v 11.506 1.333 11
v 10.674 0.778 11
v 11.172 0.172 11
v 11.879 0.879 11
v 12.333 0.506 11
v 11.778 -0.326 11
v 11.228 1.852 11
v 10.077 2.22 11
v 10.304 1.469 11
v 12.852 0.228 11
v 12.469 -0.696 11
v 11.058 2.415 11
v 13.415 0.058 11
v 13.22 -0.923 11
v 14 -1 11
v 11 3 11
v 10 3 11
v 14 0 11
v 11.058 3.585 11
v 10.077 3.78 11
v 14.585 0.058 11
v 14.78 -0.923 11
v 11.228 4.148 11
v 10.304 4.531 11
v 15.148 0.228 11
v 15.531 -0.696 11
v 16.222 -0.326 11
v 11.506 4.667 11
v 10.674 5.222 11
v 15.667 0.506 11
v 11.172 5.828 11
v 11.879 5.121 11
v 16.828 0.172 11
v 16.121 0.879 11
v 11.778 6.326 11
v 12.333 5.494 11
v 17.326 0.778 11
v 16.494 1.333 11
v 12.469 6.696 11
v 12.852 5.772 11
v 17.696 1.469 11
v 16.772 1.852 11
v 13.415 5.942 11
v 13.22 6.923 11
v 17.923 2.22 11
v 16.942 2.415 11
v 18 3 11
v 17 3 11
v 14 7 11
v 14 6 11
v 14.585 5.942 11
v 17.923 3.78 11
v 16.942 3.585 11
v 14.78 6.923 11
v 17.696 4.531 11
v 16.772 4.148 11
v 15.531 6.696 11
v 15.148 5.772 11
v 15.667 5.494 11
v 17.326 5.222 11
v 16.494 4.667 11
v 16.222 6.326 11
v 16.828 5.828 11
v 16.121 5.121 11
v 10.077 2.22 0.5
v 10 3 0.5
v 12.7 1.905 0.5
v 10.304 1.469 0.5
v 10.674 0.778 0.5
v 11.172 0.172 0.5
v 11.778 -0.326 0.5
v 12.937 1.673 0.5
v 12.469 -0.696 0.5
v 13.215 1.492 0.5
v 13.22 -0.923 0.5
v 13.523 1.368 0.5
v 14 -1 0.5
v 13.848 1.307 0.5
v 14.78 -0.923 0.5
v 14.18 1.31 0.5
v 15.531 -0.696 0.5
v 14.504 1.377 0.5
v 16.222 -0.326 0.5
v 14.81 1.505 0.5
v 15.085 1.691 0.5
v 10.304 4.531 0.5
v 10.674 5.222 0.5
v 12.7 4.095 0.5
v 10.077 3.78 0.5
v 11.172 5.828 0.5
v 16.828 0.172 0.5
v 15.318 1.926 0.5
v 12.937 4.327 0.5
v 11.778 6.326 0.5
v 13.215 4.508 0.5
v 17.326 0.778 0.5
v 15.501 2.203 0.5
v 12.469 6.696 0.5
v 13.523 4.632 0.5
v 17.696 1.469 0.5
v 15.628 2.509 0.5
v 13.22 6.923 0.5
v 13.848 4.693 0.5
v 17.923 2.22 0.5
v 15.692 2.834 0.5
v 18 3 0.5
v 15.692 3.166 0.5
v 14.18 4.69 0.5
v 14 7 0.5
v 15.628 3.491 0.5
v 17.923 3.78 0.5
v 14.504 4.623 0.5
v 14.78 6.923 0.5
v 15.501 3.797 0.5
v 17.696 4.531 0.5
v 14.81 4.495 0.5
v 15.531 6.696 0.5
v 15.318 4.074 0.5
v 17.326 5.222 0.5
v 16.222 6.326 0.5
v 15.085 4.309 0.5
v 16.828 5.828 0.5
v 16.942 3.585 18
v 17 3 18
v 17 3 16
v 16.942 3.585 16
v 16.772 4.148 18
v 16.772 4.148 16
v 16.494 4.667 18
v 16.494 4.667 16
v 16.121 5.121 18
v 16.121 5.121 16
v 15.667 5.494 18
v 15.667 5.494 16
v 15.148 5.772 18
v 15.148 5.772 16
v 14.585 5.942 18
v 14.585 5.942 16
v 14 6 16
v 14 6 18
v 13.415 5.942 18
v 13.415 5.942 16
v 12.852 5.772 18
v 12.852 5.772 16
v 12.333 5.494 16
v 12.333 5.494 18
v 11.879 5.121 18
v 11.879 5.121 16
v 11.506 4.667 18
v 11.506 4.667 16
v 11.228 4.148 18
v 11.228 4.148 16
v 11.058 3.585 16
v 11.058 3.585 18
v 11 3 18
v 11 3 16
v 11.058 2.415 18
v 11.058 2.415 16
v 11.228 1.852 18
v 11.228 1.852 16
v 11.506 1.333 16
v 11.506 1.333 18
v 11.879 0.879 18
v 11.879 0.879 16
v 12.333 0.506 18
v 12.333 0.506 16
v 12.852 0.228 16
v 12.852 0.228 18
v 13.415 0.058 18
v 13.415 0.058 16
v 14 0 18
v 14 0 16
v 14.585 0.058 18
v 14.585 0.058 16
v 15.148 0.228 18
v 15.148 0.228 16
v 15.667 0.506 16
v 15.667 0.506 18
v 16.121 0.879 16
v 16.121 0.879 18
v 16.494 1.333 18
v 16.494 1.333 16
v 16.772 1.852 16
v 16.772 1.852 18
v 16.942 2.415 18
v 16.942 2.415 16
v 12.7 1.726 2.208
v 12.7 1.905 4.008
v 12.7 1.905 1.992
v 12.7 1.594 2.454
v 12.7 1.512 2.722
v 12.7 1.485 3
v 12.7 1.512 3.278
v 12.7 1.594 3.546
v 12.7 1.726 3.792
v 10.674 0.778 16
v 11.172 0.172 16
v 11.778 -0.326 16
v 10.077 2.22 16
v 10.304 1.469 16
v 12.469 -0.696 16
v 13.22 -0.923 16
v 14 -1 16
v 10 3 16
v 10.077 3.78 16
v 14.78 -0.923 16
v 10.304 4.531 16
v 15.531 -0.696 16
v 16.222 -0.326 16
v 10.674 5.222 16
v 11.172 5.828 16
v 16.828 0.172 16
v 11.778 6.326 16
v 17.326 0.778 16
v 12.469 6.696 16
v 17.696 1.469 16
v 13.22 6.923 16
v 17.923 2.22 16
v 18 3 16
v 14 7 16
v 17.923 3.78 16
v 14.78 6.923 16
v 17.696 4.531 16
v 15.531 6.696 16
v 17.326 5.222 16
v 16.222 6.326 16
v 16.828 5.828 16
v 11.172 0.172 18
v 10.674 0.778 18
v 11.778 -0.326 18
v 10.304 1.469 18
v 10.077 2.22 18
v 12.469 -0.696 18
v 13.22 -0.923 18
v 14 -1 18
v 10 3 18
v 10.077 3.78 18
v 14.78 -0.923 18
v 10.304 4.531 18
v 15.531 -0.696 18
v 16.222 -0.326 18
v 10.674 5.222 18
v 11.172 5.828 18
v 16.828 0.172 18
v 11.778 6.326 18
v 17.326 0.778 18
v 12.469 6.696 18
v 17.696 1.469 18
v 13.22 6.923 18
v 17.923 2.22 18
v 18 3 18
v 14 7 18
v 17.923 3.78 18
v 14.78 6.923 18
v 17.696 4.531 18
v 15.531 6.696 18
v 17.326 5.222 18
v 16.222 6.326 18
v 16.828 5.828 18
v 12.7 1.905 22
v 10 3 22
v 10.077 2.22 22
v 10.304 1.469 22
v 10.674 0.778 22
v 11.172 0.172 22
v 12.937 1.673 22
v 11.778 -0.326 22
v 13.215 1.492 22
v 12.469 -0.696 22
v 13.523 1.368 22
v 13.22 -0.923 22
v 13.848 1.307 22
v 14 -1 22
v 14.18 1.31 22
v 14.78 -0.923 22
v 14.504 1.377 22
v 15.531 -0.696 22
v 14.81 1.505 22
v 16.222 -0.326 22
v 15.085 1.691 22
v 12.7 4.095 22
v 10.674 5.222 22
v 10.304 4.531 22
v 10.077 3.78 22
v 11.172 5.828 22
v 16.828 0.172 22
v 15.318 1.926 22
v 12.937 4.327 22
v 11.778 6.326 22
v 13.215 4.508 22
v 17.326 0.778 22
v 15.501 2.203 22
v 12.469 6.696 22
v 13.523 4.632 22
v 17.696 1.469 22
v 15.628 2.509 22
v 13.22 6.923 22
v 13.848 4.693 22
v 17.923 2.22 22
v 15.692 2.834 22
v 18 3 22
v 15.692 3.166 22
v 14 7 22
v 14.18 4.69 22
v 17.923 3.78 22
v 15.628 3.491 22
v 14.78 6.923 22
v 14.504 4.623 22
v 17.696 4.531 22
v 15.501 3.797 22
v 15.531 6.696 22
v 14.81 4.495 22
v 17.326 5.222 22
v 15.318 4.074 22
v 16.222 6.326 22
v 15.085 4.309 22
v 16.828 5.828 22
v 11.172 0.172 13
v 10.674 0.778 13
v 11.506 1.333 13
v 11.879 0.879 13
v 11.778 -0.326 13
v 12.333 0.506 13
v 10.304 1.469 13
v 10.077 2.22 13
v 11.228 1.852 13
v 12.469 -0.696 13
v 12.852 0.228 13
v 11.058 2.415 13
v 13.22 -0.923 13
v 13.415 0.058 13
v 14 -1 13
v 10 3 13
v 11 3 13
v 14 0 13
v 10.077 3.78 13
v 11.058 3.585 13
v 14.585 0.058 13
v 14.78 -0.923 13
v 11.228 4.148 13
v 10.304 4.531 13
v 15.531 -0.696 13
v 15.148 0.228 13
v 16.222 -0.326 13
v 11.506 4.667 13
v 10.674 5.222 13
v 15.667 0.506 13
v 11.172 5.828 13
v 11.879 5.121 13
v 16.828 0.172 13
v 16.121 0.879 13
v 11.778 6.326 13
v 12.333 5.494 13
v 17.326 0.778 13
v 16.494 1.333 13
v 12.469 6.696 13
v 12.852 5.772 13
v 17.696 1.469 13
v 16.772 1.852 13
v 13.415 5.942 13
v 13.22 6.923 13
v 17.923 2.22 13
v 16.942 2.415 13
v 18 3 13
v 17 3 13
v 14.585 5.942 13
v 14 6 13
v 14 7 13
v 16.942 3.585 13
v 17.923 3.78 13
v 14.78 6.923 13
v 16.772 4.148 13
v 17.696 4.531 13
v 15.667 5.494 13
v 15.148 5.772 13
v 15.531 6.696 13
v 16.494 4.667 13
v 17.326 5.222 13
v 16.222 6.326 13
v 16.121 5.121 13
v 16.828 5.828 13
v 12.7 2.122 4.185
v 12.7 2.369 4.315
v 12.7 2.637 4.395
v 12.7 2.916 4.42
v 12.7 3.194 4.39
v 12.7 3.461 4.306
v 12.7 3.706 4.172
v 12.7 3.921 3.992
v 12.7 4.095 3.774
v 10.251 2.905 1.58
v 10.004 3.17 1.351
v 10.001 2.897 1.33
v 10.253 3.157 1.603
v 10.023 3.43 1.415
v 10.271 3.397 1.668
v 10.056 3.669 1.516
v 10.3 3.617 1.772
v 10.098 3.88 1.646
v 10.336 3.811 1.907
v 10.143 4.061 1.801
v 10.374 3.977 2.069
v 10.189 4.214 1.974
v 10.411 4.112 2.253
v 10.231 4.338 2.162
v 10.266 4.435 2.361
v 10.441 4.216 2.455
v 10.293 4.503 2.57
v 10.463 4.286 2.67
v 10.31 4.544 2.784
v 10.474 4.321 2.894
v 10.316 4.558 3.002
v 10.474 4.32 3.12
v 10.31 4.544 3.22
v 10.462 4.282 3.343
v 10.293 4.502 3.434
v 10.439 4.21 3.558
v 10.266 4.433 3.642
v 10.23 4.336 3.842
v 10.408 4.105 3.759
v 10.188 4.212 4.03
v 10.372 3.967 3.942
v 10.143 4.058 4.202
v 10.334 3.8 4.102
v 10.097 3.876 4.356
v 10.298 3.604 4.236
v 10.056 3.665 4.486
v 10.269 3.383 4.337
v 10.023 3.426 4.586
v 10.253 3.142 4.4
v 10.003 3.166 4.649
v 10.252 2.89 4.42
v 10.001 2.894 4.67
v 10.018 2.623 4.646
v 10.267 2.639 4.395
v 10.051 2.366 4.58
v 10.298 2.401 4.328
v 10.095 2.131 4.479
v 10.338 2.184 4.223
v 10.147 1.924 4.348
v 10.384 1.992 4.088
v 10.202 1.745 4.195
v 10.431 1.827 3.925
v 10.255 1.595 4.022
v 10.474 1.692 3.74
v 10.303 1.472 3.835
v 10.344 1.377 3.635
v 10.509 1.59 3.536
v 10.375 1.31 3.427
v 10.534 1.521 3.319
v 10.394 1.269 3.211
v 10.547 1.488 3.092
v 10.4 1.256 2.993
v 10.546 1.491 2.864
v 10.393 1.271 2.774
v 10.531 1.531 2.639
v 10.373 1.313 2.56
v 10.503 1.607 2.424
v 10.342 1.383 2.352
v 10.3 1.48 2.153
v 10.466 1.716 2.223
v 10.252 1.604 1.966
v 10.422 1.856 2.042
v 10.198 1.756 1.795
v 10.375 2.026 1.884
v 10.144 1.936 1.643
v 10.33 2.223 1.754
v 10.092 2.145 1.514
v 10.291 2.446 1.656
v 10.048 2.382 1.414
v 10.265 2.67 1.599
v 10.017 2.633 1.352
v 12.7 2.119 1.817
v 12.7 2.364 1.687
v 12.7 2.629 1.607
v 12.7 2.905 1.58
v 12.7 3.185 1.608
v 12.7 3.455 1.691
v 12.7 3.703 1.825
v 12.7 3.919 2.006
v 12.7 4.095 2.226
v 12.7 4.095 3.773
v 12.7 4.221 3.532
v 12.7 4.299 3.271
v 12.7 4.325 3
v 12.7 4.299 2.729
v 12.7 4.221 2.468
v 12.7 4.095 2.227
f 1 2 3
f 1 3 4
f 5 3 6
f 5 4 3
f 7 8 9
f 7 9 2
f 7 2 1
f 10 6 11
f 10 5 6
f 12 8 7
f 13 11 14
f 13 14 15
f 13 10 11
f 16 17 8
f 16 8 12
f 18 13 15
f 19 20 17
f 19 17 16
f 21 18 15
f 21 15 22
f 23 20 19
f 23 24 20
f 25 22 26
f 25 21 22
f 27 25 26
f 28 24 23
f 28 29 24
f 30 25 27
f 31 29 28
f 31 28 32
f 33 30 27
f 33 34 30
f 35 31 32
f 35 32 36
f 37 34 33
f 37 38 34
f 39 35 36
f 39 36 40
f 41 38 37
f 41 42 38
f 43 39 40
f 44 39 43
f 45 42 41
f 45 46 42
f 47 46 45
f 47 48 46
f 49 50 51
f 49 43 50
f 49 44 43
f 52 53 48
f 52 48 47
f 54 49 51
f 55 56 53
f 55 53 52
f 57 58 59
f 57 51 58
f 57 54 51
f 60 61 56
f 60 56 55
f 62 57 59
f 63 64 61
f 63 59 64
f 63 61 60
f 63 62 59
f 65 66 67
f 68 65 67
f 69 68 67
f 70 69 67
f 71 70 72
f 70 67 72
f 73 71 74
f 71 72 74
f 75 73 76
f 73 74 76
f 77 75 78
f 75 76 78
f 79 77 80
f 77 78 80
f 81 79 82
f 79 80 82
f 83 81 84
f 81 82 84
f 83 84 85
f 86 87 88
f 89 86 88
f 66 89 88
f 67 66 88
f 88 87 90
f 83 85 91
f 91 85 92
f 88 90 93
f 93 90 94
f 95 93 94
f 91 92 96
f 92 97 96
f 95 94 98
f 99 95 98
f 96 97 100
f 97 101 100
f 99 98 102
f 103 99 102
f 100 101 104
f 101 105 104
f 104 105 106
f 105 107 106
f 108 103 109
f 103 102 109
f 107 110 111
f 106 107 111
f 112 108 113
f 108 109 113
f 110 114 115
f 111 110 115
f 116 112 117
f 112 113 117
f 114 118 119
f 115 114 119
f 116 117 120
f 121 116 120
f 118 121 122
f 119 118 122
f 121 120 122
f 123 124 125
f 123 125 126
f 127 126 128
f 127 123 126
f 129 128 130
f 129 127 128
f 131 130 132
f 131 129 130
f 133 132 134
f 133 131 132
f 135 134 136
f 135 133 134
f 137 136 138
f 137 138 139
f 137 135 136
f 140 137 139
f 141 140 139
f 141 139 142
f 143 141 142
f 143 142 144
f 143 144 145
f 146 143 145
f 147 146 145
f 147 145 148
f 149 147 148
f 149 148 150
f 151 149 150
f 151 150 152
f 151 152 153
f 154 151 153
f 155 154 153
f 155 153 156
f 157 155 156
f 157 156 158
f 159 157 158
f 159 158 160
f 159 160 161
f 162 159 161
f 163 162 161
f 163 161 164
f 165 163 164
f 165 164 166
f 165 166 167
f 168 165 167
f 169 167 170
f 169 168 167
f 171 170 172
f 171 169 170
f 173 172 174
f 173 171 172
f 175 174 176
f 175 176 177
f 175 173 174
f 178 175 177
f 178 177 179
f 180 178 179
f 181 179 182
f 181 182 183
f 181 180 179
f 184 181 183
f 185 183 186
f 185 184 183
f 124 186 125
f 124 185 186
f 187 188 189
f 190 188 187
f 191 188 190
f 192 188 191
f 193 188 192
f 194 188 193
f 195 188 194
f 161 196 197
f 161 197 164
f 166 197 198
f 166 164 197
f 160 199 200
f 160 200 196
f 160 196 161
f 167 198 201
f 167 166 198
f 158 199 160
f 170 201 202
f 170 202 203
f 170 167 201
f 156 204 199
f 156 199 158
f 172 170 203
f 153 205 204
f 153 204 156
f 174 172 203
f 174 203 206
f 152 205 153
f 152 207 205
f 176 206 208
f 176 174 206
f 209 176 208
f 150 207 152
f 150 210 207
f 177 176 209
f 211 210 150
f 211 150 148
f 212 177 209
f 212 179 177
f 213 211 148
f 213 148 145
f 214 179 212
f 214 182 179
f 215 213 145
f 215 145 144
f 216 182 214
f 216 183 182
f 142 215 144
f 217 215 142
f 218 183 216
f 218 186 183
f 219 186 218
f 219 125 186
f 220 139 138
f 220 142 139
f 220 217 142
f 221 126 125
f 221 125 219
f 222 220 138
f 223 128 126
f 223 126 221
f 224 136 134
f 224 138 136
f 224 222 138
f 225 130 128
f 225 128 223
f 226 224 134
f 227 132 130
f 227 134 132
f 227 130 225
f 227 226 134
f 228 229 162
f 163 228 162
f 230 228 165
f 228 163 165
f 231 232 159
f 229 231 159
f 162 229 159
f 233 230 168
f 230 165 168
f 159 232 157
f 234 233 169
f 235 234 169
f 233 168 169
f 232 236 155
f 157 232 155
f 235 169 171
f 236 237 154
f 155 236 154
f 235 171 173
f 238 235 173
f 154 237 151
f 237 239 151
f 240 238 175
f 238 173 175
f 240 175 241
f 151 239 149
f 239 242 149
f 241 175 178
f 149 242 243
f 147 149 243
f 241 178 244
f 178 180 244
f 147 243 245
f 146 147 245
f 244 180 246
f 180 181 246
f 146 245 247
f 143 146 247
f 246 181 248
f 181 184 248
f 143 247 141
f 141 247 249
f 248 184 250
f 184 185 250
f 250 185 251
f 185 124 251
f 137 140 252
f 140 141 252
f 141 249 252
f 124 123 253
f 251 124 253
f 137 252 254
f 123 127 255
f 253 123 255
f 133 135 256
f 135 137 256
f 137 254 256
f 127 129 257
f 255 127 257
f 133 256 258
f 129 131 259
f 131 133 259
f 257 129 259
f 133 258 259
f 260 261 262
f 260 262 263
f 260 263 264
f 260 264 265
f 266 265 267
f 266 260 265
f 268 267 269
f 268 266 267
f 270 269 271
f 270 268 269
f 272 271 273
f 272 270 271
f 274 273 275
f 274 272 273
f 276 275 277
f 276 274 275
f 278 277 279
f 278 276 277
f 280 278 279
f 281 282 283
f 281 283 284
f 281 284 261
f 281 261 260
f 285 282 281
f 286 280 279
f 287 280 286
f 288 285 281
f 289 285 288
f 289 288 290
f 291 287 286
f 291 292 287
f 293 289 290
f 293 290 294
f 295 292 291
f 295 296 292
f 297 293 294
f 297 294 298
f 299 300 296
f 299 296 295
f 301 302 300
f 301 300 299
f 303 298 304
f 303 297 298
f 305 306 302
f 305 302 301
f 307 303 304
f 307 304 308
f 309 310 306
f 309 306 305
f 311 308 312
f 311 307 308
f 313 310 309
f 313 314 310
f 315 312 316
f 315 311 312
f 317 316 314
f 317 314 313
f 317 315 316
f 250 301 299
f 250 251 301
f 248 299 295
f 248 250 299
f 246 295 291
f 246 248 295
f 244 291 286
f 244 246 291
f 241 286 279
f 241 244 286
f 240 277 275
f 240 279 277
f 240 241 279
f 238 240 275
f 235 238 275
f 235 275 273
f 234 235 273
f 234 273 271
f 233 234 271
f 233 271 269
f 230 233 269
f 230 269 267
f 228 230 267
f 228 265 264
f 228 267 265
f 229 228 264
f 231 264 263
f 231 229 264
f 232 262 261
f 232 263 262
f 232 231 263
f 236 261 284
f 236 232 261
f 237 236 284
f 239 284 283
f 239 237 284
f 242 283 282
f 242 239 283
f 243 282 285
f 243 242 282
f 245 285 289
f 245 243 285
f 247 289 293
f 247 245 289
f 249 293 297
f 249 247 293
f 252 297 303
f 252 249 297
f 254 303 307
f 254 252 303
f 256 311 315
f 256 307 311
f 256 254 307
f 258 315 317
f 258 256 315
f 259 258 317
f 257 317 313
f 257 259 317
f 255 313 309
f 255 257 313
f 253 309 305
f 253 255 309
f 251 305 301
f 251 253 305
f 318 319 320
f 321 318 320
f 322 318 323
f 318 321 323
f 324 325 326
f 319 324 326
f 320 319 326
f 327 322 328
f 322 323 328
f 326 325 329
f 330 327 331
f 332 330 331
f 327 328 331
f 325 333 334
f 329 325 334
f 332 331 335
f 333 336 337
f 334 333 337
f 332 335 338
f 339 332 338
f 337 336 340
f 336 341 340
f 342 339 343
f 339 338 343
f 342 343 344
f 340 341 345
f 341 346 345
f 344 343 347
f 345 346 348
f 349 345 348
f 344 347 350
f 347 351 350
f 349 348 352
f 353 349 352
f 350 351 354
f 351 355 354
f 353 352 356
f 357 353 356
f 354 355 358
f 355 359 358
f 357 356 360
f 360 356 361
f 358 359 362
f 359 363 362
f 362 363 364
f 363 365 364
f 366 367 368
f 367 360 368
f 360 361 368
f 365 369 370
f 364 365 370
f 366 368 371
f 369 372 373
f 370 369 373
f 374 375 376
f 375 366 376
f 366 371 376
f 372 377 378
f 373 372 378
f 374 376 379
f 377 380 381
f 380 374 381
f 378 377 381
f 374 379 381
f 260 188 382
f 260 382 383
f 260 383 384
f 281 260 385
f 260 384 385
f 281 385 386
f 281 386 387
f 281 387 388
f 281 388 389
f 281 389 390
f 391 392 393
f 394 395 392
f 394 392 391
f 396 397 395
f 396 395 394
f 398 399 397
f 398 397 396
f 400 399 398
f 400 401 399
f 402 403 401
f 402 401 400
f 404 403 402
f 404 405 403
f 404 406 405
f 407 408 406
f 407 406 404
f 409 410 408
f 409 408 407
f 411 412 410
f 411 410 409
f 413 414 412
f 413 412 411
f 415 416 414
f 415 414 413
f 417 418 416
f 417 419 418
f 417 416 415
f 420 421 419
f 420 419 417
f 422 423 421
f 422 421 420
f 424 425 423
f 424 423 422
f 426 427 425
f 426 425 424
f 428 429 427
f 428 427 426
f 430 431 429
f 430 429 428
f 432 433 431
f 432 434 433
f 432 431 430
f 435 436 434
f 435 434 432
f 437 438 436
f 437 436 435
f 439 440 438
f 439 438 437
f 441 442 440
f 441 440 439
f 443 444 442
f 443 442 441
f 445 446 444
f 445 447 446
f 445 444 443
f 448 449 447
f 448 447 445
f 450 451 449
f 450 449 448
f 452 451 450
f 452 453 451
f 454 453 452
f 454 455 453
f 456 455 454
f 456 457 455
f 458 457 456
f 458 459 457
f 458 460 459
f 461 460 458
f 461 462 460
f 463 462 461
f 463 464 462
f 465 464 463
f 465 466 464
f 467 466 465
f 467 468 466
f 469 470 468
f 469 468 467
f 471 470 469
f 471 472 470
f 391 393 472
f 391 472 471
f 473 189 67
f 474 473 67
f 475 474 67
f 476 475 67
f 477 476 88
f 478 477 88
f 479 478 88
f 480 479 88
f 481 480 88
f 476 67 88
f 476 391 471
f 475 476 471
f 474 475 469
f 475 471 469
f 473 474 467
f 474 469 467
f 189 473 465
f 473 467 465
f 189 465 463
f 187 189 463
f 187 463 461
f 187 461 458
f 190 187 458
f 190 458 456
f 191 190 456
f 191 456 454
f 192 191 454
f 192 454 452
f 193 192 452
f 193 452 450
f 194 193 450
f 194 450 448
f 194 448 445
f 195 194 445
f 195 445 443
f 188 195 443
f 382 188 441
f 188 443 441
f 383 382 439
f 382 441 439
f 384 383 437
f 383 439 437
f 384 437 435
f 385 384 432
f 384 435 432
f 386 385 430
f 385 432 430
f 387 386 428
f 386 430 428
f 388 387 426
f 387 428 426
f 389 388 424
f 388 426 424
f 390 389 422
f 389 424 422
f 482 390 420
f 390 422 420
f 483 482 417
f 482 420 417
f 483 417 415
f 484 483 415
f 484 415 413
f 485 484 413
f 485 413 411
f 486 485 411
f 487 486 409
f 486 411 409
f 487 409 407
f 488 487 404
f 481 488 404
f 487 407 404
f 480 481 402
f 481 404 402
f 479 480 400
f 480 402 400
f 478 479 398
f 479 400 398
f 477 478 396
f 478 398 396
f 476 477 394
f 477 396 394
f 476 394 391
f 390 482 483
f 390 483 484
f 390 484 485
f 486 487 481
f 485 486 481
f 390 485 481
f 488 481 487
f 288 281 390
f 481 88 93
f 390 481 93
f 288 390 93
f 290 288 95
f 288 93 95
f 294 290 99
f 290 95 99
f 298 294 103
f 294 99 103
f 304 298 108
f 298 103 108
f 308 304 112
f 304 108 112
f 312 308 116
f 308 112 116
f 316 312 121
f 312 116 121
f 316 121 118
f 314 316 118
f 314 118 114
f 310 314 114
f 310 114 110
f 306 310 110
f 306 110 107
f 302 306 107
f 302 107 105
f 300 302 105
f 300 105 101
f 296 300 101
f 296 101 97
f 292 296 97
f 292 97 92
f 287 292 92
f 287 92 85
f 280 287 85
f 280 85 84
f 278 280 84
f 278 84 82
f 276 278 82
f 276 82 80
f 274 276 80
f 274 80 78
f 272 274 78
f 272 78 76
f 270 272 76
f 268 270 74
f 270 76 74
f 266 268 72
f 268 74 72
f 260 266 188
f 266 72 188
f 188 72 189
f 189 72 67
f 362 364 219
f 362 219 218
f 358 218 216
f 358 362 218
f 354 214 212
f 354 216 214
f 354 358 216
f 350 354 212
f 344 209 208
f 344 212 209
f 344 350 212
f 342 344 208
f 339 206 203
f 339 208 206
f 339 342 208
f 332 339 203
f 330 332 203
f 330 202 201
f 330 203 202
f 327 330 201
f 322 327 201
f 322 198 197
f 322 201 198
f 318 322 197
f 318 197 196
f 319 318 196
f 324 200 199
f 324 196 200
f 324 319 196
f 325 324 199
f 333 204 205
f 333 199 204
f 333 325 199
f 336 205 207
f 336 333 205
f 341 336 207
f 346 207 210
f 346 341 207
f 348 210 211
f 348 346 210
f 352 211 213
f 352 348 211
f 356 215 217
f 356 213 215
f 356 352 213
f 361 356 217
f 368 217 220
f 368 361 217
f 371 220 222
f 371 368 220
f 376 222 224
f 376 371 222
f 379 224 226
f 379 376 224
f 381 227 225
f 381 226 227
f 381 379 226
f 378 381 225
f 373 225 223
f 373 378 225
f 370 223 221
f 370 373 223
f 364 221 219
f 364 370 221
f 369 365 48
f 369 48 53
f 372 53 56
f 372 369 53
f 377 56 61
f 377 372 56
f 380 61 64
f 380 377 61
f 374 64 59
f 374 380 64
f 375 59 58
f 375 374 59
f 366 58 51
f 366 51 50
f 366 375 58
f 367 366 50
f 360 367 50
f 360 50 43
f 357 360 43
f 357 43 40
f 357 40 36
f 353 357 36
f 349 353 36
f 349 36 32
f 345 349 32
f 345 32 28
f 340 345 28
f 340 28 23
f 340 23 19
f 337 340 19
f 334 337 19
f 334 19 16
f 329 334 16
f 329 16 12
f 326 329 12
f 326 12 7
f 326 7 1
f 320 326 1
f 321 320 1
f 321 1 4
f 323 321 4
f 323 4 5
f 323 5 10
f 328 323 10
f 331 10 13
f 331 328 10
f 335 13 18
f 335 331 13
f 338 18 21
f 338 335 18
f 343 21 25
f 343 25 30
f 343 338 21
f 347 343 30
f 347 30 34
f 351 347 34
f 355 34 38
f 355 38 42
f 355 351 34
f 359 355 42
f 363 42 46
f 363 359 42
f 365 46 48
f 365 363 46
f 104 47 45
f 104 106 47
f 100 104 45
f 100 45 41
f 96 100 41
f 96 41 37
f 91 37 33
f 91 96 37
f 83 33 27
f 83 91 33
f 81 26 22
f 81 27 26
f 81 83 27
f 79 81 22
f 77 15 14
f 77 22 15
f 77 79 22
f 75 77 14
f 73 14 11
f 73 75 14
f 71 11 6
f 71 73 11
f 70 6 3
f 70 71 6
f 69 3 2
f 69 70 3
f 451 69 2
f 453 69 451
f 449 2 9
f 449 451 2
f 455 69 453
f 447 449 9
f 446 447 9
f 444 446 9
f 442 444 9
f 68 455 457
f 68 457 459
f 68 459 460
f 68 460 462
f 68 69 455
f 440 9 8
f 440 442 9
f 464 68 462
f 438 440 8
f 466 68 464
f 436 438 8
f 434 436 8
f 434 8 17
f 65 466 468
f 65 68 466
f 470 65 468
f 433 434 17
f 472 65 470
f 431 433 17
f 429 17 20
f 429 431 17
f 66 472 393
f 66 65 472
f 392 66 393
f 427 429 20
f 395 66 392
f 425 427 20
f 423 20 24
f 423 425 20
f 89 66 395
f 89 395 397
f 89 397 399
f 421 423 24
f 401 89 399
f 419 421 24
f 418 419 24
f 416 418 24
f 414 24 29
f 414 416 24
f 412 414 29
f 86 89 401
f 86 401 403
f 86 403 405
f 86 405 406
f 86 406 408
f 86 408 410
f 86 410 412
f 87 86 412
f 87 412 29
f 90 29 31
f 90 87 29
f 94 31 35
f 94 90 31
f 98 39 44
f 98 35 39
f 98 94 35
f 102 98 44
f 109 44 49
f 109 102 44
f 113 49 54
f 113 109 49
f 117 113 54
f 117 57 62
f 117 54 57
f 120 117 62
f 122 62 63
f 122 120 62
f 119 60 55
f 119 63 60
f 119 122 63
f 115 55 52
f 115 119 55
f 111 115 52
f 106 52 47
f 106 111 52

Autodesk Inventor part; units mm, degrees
ref_plane "YZ Plane" through (0, 0, 0) normal (1, 0, 0) x (0, 1, 0)
ref_plane "XZ Plane" through (0, 0, 0) normal (0, 1, 0) x (-1, 0, 0)
ref_plane "XY Plane" through (0, 0, 0) normal (0, 0, 1) x (1, 0, 0)
ref_plane "Work Plane1" through (0, 0, 0.5) normal (0, 0, 1) x (1, 0, 0)
sketch "Sketch1" plane through (0, 0, 0.5) normal (0, 0, 1) x (1, 0, 0)
  arc A0 (13, 1.882) -> (13, 4.118) centre (14, 3) ccw projected
  arc A1 (13, 1.882) -> (13, 4.118) centre (14, 3) ccw projected
  line L0 (13, 4.118) -> (13, 1.882) projected
  circle A2 centre (14, 3) radius 6
  circle A3 centre (14, 3) radius 4
  circle A4 centre (14, 3) radius 1.7
  line L1 (12.7, 1.9046) -> (12.7, 4.0954)
  point P0 (0, 0)
  dimension "d0" = 12
  dimension "d1" = 8
  dimension "d2" = 0.2
  dimension "d3" = 0.3
extrude "Extrusion1" add sketch "Sketch1" along normal blind 21.5 contours A3 | L1 A4 picked at (12.5667, 3)
ref_plane "Work Plane2" through (14, 3, 18) normal (0, 0, 1) x (1, 0, 0)
sketch "Sketch2" plane through (14, 3, 18) normal (0, 0, 1) x (1, 0, 0)
  circle A0 centre (0, 0) radius 4 projected
  arc A1 (-1.3, -1.0954) -> (-1.3, 1.0954) centre (0, 0) ccw projected
  line L0 (-1.3, -1.0954) -> (-1.3, 1.0954) projected
  circle A2 centre (0, 0) radius 3
  point P0 (-14, -3)
  dimension "d7" = 6
extrude "Extrusion2" cut sketch "Sketch2" against normal blind 2 contours A0
ref_plane "Work Plane3" through (9.7, 1.9046, 0.5) normal (1, 0, 0) x (0, 0, -1)
sketch "Sketch3" plane through (9.7, 1.9046, 0.5) normal (1, 0, 0) x (0, 0, -1)
  circle A0 centre (-2.5, 1) radius 1.42
  line L0 (-21.5, 0) -> (-21.5, 2.1909) projected
  point P0 (0.5, -1.9046)
  dimension "d11" = 2.84
  dimension "d12" = 1
  dimension "d15" = 19
extrude "Extrusion3" cut sketch "Sketch3" along normal blind 3
chamfer "Chamfer1" distance 0.25 angle 45 1 edges at (10.0014, 2.8952, 4.42)
ref_plane "Work Plane4" through (14, 3, 13) normal (0, 0, 1) x (1, 0, 0)
sketch "Sketch4" plane through (14, 3, 13) normal (0, 0, 1) x (1, 0, 0)
  circle A0 centre (0, 0) radius 4 projected
  circle A1 centre (0, 0) radius 4 projected
  circle A2 centre (0, 0) radius 3 projected
  point P0 (-14, -3)
extrude "Extrusion4" cut sketch "Sketch4" against normal blind 2
properties part number "rim-v1" material "Tworzywo sztuczne PET"
